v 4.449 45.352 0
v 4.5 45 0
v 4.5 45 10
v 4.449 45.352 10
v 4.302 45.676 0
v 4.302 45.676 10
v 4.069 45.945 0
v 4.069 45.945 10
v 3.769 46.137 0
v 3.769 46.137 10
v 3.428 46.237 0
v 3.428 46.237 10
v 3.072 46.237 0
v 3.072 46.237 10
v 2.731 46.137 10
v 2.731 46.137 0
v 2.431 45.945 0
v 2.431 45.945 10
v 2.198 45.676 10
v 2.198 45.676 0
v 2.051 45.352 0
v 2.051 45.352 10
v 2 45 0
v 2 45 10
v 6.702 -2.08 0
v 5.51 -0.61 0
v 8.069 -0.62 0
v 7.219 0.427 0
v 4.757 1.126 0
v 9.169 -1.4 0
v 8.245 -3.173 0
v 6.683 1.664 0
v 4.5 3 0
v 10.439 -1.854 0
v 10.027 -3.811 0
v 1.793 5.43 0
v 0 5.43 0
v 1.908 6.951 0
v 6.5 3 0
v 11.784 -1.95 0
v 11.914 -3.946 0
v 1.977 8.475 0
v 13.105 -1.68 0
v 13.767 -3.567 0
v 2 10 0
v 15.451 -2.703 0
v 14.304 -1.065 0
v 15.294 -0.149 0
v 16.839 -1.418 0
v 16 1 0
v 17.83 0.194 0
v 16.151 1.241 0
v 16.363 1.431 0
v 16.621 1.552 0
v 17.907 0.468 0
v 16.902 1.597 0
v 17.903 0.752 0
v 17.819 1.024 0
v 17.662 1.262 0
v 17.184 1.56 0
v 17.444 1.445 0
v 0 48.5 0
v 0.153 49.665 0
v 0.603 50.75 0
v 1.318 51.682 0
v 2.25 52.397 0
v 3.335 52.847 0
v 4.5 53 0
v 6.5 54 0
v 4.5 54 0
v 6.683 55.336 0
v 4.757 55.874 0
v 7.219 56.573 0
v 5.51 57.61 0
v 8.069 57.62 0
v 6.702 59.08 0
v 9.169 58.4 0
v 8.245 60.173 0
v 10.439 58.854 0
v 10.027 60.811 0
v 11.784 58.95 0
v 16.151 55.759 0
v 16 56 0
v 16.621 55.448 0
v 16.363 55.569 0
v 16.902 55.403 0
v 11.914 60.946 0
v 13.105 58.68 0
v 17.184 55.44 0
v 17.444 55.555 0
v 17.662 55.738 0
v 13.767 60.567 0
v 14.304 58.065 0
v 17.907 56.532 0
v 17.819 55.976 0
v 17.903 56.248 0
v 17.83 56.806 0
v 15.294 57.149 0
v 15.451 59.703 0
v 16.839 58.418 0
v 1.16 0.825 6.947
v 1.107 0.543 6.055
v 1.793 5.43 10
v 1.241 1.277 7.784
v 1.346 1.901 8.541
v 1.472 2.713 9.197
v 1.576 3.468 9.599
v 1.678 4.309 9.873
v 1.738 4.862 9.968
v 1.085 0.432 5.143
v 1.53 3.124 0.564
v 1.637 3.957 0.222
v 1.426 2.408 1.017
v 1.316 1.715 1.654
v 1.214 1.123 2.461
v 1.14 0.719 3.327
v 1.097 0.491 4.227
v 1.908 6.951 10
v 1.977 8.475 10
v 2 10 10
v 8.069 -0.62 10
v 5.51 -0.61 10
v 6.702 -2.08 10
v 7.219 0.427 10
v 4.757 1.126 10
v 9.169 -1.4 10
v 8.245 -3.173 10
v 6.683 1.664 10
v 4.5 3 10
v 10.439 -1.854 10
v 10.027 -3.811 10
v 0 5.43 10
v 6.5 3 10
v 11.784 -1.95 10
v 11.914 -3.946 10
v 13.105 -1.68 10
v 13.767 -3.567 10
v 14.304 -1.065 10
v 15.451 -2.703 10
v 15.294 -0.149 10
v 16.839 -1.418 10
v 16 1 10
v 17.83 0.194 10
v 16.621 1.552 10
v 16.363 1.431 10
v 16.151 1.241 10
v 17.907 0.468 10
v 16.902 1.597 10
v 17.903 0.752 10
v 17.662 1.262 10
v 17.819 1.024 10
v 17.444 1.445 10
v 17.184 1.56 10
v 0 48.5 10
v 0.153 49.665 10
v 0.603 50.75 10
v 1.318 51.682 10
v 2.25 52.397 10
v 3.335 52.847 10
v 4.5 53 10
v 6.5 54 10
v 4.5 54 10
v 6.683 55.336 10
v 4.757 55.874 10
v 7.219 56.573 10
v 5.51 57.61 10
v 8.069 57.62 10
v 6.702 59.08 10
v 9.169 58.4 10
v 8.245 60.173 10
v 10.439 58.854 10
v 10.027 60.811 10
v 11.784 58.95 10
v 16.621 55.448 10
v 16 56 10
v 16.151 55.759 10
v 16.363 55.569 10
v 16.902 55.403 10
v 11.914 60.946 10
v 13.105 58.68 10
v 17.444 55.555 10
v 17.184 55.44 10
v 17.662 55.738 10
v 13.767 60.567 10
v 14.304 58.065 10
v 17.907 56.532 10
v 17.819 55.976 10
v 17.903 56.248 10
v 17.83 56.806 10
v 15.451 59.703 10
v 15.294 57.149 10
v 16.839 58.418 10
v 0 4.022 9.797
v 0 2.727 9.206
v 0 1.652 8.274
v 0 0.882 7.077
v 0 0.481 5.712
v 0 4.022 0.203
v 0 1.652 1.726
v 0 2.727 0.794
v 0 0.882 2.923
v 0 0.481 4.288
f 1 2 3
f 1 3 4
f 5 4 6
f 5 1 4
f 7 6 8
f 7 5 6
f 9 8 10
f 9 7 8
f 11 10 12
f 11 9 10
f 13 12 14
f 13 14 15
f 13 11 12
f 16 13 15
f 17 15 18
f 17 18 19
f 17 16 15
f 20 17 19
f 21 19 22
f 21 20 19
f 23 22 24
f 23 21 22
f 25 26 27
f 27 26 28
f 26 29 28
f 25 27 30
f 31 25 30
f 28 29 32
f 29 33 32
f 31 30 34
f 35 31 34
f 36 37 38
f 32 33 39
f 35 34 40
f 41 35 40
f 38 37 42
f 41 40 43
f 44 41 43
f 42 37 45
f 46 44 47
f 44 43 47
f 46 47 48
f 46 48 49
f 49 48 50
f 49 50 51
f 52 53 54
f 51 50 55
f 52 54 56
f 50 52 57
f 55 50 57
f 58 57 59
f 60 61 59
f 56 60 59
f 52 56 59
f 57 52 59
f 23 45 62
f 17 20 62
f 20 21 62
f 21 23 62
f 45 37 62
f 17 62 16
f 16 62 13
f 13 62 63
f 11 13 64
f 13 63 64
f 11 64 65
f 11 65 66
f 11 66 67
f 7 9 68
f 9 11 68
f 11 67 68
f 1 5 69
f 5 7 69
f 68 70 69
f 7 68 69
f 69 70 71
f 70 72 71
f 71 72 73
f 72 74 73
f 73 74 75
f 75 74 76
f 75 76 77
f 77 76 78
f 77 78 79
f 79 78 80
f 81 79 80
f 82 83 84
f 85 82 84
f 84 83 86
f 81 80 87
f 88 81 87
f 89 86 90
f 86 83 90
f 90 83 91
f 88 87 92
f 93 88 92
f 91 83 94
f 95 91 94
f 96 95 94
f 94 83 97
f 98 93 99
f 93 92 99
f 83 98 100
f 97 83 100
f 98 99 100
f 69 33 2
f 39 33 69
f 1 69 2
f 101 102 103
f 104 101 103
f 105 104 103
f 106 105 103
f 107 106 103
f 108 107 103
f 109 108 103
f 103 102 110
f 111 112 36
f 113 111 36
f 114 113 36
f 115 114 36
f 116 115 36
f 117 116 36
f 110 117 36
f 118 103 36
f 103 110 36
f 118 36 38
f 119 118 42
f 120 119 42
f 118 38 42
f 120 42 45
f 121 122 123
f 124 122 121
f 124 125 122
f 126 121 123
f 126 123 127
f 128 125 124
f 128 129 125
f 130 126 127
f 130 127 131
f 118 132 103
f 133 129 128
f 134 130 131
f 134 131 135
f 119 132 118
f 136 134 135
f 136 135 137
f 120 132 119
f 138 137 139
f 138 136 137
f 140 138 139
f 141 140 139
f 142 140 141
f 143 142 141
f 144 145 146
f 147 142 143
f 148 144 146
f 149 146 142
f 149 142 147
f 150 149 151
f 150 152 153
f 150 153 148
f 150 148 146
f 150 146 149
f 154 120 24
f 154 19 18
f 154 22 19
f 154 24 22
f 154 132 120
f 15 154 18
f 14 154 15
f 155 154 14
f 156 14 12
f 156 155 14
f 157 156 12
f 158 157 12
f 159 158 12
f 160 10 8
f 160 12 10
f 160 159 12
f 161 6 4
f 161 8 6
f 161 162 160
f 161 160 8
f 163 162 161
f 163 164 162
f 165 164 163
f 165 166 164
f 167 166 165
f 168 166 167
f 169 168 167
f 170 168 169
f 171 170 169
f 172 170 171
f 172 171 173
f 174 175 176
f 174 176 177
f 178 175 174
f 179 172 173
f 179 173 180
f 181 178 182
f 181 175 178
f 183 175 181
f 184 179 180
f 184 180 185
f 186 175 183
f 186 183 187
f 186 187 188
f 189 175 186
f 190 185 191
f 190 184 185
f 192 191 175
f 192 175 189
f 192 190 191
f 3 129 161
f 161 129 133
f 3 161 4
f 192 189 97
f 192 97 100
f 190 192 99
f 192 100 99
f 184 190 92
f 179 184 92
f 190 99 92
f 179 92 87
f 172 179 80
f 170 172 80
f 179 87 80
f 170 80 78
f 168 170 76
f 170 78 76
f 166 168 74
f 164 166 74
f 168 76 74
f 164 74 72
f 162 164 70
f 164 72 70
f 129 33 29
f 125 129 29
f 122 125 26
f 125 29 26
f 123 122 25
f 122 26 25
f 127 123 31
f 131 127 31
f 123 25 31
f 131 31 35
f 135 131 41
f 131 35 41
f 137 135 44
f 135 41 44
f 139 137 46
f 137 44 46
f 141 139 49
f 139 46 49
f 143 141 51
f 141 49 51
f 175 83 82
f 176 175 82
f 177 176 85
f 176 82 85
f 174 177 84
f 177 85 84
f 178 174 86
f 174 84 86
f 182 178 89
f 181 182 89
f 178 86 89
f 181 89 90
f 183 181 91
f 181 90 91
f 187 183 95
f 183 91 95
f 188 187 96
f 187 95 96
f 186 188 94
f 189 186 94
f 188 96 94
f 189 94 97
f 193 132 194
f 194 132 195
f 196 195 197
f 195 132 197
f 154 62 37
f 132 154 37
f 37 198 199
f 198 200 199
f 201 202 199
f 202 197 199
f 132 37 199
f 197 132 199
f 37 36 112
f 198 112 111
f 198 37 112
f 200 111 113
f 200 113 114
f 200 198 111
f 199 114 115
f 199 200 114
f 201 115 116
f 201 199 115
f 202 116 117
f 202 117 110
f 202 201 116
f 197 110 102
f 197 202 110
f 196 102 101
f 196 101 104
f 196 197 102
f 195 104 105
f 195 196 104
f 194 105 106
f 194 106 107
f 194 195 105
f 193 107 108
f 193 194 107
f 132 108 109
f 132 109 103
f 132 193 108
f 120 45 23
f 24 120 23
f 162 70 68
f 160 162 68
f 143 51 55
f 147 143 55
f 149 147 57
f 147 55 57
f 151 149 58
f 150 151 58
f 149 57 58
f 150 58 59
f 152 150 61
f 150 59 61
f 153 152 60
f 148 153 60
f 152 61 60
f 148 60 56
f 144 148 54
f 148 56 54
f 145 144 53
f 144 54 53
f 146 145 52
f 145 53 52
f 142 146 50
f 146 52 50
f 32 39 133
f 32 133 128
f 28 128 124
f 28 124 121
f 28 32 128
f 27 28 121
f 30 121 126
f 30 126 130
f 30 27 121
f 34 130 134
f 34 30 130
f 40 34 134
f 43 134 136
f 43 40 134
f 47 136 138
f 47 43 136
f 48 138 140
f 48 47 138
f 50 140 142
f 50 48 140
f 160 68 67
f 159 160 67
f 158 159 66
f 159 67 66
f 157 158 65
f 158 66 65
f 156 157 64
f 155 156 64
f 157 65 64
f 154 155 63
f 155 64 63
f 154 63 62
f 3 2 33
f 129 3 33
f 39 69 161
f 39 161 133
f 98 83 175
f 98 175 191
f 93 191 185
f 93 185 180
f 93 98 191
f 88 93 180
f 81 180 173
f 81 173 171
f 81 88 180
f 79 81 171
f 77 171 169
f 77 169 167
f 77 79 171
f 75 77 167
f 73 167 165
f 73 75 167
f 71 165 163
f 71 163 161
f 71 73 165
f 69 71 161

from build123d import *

# Parameters (mm, degrees)
PAD_DEPTH    = 10
POCKET_DEPTH = 4


with BuildPart() as part:
    # Sketch → Pad (new body)
    with BuildSketch(Plane.XY):
        with BuildLine():
            Line((0, 48.5), (0, 0))
            Line((0, 0), (1, 0))
            ThreePointArc((1, 0), (1.749378, 4.975062), (2, 10))
            Line((2, 10), (2, 45))
            ThreePointArc((4.5, 45), (3.25, 46.25), (2, 45))
            Line((4.5, 45), (4.5, 3))
            ThreePointArc((4.5, 3), (10.026585, -3.811222), (17.830239, 0.193634))
            ThreePointArc((17.830239, 0.193634), (17.318302, 1.511936), (16, 1))
            ThreePointArc((6.5, 3), (10.438606, -1.854122), (16, 1))
            Line((6.5, 54), (6.5, 3))
            ThreePointArc((16, 56), (10.438606, 58.854122), (6.5, 54))
            ThreePointArc((16, 56), (17.318302, 55.488064), (17.830239, 56.806366))
            ThreePointArc((17.830239, 56.806366), (10.026585, 60.811222), (4.5, 54))
            Line((4.5, 54), (4.5, 53))
            ThreePointArc((4.5, 53), (1.318019, 51.681981), (0, 48.5))
        make_face()
    extrude(amount=PAD_DEPTH)

    # Sketch001 → Pocket (cut)
    with BuildSketch(Plane(origin=(0, 0, 0), x_dir=(0, -1, 0), z_dir=(-1, 0, 0))):
        with BuildLine():
            ThreePointArc((-5.430454, 0), (-0.430454, 5), (-5.430454, 10))
            Line((-5.430454, 10), (44.569546, 10))
            Line((44.569546, 10), (44.569546, 0))
            Line((44.569546, 0), (-5.430454, 0))
        make_face()
    extrude(amount=-POCKET_DEPTH, mode=Mode.SUBTRACT)


solid = part.part
